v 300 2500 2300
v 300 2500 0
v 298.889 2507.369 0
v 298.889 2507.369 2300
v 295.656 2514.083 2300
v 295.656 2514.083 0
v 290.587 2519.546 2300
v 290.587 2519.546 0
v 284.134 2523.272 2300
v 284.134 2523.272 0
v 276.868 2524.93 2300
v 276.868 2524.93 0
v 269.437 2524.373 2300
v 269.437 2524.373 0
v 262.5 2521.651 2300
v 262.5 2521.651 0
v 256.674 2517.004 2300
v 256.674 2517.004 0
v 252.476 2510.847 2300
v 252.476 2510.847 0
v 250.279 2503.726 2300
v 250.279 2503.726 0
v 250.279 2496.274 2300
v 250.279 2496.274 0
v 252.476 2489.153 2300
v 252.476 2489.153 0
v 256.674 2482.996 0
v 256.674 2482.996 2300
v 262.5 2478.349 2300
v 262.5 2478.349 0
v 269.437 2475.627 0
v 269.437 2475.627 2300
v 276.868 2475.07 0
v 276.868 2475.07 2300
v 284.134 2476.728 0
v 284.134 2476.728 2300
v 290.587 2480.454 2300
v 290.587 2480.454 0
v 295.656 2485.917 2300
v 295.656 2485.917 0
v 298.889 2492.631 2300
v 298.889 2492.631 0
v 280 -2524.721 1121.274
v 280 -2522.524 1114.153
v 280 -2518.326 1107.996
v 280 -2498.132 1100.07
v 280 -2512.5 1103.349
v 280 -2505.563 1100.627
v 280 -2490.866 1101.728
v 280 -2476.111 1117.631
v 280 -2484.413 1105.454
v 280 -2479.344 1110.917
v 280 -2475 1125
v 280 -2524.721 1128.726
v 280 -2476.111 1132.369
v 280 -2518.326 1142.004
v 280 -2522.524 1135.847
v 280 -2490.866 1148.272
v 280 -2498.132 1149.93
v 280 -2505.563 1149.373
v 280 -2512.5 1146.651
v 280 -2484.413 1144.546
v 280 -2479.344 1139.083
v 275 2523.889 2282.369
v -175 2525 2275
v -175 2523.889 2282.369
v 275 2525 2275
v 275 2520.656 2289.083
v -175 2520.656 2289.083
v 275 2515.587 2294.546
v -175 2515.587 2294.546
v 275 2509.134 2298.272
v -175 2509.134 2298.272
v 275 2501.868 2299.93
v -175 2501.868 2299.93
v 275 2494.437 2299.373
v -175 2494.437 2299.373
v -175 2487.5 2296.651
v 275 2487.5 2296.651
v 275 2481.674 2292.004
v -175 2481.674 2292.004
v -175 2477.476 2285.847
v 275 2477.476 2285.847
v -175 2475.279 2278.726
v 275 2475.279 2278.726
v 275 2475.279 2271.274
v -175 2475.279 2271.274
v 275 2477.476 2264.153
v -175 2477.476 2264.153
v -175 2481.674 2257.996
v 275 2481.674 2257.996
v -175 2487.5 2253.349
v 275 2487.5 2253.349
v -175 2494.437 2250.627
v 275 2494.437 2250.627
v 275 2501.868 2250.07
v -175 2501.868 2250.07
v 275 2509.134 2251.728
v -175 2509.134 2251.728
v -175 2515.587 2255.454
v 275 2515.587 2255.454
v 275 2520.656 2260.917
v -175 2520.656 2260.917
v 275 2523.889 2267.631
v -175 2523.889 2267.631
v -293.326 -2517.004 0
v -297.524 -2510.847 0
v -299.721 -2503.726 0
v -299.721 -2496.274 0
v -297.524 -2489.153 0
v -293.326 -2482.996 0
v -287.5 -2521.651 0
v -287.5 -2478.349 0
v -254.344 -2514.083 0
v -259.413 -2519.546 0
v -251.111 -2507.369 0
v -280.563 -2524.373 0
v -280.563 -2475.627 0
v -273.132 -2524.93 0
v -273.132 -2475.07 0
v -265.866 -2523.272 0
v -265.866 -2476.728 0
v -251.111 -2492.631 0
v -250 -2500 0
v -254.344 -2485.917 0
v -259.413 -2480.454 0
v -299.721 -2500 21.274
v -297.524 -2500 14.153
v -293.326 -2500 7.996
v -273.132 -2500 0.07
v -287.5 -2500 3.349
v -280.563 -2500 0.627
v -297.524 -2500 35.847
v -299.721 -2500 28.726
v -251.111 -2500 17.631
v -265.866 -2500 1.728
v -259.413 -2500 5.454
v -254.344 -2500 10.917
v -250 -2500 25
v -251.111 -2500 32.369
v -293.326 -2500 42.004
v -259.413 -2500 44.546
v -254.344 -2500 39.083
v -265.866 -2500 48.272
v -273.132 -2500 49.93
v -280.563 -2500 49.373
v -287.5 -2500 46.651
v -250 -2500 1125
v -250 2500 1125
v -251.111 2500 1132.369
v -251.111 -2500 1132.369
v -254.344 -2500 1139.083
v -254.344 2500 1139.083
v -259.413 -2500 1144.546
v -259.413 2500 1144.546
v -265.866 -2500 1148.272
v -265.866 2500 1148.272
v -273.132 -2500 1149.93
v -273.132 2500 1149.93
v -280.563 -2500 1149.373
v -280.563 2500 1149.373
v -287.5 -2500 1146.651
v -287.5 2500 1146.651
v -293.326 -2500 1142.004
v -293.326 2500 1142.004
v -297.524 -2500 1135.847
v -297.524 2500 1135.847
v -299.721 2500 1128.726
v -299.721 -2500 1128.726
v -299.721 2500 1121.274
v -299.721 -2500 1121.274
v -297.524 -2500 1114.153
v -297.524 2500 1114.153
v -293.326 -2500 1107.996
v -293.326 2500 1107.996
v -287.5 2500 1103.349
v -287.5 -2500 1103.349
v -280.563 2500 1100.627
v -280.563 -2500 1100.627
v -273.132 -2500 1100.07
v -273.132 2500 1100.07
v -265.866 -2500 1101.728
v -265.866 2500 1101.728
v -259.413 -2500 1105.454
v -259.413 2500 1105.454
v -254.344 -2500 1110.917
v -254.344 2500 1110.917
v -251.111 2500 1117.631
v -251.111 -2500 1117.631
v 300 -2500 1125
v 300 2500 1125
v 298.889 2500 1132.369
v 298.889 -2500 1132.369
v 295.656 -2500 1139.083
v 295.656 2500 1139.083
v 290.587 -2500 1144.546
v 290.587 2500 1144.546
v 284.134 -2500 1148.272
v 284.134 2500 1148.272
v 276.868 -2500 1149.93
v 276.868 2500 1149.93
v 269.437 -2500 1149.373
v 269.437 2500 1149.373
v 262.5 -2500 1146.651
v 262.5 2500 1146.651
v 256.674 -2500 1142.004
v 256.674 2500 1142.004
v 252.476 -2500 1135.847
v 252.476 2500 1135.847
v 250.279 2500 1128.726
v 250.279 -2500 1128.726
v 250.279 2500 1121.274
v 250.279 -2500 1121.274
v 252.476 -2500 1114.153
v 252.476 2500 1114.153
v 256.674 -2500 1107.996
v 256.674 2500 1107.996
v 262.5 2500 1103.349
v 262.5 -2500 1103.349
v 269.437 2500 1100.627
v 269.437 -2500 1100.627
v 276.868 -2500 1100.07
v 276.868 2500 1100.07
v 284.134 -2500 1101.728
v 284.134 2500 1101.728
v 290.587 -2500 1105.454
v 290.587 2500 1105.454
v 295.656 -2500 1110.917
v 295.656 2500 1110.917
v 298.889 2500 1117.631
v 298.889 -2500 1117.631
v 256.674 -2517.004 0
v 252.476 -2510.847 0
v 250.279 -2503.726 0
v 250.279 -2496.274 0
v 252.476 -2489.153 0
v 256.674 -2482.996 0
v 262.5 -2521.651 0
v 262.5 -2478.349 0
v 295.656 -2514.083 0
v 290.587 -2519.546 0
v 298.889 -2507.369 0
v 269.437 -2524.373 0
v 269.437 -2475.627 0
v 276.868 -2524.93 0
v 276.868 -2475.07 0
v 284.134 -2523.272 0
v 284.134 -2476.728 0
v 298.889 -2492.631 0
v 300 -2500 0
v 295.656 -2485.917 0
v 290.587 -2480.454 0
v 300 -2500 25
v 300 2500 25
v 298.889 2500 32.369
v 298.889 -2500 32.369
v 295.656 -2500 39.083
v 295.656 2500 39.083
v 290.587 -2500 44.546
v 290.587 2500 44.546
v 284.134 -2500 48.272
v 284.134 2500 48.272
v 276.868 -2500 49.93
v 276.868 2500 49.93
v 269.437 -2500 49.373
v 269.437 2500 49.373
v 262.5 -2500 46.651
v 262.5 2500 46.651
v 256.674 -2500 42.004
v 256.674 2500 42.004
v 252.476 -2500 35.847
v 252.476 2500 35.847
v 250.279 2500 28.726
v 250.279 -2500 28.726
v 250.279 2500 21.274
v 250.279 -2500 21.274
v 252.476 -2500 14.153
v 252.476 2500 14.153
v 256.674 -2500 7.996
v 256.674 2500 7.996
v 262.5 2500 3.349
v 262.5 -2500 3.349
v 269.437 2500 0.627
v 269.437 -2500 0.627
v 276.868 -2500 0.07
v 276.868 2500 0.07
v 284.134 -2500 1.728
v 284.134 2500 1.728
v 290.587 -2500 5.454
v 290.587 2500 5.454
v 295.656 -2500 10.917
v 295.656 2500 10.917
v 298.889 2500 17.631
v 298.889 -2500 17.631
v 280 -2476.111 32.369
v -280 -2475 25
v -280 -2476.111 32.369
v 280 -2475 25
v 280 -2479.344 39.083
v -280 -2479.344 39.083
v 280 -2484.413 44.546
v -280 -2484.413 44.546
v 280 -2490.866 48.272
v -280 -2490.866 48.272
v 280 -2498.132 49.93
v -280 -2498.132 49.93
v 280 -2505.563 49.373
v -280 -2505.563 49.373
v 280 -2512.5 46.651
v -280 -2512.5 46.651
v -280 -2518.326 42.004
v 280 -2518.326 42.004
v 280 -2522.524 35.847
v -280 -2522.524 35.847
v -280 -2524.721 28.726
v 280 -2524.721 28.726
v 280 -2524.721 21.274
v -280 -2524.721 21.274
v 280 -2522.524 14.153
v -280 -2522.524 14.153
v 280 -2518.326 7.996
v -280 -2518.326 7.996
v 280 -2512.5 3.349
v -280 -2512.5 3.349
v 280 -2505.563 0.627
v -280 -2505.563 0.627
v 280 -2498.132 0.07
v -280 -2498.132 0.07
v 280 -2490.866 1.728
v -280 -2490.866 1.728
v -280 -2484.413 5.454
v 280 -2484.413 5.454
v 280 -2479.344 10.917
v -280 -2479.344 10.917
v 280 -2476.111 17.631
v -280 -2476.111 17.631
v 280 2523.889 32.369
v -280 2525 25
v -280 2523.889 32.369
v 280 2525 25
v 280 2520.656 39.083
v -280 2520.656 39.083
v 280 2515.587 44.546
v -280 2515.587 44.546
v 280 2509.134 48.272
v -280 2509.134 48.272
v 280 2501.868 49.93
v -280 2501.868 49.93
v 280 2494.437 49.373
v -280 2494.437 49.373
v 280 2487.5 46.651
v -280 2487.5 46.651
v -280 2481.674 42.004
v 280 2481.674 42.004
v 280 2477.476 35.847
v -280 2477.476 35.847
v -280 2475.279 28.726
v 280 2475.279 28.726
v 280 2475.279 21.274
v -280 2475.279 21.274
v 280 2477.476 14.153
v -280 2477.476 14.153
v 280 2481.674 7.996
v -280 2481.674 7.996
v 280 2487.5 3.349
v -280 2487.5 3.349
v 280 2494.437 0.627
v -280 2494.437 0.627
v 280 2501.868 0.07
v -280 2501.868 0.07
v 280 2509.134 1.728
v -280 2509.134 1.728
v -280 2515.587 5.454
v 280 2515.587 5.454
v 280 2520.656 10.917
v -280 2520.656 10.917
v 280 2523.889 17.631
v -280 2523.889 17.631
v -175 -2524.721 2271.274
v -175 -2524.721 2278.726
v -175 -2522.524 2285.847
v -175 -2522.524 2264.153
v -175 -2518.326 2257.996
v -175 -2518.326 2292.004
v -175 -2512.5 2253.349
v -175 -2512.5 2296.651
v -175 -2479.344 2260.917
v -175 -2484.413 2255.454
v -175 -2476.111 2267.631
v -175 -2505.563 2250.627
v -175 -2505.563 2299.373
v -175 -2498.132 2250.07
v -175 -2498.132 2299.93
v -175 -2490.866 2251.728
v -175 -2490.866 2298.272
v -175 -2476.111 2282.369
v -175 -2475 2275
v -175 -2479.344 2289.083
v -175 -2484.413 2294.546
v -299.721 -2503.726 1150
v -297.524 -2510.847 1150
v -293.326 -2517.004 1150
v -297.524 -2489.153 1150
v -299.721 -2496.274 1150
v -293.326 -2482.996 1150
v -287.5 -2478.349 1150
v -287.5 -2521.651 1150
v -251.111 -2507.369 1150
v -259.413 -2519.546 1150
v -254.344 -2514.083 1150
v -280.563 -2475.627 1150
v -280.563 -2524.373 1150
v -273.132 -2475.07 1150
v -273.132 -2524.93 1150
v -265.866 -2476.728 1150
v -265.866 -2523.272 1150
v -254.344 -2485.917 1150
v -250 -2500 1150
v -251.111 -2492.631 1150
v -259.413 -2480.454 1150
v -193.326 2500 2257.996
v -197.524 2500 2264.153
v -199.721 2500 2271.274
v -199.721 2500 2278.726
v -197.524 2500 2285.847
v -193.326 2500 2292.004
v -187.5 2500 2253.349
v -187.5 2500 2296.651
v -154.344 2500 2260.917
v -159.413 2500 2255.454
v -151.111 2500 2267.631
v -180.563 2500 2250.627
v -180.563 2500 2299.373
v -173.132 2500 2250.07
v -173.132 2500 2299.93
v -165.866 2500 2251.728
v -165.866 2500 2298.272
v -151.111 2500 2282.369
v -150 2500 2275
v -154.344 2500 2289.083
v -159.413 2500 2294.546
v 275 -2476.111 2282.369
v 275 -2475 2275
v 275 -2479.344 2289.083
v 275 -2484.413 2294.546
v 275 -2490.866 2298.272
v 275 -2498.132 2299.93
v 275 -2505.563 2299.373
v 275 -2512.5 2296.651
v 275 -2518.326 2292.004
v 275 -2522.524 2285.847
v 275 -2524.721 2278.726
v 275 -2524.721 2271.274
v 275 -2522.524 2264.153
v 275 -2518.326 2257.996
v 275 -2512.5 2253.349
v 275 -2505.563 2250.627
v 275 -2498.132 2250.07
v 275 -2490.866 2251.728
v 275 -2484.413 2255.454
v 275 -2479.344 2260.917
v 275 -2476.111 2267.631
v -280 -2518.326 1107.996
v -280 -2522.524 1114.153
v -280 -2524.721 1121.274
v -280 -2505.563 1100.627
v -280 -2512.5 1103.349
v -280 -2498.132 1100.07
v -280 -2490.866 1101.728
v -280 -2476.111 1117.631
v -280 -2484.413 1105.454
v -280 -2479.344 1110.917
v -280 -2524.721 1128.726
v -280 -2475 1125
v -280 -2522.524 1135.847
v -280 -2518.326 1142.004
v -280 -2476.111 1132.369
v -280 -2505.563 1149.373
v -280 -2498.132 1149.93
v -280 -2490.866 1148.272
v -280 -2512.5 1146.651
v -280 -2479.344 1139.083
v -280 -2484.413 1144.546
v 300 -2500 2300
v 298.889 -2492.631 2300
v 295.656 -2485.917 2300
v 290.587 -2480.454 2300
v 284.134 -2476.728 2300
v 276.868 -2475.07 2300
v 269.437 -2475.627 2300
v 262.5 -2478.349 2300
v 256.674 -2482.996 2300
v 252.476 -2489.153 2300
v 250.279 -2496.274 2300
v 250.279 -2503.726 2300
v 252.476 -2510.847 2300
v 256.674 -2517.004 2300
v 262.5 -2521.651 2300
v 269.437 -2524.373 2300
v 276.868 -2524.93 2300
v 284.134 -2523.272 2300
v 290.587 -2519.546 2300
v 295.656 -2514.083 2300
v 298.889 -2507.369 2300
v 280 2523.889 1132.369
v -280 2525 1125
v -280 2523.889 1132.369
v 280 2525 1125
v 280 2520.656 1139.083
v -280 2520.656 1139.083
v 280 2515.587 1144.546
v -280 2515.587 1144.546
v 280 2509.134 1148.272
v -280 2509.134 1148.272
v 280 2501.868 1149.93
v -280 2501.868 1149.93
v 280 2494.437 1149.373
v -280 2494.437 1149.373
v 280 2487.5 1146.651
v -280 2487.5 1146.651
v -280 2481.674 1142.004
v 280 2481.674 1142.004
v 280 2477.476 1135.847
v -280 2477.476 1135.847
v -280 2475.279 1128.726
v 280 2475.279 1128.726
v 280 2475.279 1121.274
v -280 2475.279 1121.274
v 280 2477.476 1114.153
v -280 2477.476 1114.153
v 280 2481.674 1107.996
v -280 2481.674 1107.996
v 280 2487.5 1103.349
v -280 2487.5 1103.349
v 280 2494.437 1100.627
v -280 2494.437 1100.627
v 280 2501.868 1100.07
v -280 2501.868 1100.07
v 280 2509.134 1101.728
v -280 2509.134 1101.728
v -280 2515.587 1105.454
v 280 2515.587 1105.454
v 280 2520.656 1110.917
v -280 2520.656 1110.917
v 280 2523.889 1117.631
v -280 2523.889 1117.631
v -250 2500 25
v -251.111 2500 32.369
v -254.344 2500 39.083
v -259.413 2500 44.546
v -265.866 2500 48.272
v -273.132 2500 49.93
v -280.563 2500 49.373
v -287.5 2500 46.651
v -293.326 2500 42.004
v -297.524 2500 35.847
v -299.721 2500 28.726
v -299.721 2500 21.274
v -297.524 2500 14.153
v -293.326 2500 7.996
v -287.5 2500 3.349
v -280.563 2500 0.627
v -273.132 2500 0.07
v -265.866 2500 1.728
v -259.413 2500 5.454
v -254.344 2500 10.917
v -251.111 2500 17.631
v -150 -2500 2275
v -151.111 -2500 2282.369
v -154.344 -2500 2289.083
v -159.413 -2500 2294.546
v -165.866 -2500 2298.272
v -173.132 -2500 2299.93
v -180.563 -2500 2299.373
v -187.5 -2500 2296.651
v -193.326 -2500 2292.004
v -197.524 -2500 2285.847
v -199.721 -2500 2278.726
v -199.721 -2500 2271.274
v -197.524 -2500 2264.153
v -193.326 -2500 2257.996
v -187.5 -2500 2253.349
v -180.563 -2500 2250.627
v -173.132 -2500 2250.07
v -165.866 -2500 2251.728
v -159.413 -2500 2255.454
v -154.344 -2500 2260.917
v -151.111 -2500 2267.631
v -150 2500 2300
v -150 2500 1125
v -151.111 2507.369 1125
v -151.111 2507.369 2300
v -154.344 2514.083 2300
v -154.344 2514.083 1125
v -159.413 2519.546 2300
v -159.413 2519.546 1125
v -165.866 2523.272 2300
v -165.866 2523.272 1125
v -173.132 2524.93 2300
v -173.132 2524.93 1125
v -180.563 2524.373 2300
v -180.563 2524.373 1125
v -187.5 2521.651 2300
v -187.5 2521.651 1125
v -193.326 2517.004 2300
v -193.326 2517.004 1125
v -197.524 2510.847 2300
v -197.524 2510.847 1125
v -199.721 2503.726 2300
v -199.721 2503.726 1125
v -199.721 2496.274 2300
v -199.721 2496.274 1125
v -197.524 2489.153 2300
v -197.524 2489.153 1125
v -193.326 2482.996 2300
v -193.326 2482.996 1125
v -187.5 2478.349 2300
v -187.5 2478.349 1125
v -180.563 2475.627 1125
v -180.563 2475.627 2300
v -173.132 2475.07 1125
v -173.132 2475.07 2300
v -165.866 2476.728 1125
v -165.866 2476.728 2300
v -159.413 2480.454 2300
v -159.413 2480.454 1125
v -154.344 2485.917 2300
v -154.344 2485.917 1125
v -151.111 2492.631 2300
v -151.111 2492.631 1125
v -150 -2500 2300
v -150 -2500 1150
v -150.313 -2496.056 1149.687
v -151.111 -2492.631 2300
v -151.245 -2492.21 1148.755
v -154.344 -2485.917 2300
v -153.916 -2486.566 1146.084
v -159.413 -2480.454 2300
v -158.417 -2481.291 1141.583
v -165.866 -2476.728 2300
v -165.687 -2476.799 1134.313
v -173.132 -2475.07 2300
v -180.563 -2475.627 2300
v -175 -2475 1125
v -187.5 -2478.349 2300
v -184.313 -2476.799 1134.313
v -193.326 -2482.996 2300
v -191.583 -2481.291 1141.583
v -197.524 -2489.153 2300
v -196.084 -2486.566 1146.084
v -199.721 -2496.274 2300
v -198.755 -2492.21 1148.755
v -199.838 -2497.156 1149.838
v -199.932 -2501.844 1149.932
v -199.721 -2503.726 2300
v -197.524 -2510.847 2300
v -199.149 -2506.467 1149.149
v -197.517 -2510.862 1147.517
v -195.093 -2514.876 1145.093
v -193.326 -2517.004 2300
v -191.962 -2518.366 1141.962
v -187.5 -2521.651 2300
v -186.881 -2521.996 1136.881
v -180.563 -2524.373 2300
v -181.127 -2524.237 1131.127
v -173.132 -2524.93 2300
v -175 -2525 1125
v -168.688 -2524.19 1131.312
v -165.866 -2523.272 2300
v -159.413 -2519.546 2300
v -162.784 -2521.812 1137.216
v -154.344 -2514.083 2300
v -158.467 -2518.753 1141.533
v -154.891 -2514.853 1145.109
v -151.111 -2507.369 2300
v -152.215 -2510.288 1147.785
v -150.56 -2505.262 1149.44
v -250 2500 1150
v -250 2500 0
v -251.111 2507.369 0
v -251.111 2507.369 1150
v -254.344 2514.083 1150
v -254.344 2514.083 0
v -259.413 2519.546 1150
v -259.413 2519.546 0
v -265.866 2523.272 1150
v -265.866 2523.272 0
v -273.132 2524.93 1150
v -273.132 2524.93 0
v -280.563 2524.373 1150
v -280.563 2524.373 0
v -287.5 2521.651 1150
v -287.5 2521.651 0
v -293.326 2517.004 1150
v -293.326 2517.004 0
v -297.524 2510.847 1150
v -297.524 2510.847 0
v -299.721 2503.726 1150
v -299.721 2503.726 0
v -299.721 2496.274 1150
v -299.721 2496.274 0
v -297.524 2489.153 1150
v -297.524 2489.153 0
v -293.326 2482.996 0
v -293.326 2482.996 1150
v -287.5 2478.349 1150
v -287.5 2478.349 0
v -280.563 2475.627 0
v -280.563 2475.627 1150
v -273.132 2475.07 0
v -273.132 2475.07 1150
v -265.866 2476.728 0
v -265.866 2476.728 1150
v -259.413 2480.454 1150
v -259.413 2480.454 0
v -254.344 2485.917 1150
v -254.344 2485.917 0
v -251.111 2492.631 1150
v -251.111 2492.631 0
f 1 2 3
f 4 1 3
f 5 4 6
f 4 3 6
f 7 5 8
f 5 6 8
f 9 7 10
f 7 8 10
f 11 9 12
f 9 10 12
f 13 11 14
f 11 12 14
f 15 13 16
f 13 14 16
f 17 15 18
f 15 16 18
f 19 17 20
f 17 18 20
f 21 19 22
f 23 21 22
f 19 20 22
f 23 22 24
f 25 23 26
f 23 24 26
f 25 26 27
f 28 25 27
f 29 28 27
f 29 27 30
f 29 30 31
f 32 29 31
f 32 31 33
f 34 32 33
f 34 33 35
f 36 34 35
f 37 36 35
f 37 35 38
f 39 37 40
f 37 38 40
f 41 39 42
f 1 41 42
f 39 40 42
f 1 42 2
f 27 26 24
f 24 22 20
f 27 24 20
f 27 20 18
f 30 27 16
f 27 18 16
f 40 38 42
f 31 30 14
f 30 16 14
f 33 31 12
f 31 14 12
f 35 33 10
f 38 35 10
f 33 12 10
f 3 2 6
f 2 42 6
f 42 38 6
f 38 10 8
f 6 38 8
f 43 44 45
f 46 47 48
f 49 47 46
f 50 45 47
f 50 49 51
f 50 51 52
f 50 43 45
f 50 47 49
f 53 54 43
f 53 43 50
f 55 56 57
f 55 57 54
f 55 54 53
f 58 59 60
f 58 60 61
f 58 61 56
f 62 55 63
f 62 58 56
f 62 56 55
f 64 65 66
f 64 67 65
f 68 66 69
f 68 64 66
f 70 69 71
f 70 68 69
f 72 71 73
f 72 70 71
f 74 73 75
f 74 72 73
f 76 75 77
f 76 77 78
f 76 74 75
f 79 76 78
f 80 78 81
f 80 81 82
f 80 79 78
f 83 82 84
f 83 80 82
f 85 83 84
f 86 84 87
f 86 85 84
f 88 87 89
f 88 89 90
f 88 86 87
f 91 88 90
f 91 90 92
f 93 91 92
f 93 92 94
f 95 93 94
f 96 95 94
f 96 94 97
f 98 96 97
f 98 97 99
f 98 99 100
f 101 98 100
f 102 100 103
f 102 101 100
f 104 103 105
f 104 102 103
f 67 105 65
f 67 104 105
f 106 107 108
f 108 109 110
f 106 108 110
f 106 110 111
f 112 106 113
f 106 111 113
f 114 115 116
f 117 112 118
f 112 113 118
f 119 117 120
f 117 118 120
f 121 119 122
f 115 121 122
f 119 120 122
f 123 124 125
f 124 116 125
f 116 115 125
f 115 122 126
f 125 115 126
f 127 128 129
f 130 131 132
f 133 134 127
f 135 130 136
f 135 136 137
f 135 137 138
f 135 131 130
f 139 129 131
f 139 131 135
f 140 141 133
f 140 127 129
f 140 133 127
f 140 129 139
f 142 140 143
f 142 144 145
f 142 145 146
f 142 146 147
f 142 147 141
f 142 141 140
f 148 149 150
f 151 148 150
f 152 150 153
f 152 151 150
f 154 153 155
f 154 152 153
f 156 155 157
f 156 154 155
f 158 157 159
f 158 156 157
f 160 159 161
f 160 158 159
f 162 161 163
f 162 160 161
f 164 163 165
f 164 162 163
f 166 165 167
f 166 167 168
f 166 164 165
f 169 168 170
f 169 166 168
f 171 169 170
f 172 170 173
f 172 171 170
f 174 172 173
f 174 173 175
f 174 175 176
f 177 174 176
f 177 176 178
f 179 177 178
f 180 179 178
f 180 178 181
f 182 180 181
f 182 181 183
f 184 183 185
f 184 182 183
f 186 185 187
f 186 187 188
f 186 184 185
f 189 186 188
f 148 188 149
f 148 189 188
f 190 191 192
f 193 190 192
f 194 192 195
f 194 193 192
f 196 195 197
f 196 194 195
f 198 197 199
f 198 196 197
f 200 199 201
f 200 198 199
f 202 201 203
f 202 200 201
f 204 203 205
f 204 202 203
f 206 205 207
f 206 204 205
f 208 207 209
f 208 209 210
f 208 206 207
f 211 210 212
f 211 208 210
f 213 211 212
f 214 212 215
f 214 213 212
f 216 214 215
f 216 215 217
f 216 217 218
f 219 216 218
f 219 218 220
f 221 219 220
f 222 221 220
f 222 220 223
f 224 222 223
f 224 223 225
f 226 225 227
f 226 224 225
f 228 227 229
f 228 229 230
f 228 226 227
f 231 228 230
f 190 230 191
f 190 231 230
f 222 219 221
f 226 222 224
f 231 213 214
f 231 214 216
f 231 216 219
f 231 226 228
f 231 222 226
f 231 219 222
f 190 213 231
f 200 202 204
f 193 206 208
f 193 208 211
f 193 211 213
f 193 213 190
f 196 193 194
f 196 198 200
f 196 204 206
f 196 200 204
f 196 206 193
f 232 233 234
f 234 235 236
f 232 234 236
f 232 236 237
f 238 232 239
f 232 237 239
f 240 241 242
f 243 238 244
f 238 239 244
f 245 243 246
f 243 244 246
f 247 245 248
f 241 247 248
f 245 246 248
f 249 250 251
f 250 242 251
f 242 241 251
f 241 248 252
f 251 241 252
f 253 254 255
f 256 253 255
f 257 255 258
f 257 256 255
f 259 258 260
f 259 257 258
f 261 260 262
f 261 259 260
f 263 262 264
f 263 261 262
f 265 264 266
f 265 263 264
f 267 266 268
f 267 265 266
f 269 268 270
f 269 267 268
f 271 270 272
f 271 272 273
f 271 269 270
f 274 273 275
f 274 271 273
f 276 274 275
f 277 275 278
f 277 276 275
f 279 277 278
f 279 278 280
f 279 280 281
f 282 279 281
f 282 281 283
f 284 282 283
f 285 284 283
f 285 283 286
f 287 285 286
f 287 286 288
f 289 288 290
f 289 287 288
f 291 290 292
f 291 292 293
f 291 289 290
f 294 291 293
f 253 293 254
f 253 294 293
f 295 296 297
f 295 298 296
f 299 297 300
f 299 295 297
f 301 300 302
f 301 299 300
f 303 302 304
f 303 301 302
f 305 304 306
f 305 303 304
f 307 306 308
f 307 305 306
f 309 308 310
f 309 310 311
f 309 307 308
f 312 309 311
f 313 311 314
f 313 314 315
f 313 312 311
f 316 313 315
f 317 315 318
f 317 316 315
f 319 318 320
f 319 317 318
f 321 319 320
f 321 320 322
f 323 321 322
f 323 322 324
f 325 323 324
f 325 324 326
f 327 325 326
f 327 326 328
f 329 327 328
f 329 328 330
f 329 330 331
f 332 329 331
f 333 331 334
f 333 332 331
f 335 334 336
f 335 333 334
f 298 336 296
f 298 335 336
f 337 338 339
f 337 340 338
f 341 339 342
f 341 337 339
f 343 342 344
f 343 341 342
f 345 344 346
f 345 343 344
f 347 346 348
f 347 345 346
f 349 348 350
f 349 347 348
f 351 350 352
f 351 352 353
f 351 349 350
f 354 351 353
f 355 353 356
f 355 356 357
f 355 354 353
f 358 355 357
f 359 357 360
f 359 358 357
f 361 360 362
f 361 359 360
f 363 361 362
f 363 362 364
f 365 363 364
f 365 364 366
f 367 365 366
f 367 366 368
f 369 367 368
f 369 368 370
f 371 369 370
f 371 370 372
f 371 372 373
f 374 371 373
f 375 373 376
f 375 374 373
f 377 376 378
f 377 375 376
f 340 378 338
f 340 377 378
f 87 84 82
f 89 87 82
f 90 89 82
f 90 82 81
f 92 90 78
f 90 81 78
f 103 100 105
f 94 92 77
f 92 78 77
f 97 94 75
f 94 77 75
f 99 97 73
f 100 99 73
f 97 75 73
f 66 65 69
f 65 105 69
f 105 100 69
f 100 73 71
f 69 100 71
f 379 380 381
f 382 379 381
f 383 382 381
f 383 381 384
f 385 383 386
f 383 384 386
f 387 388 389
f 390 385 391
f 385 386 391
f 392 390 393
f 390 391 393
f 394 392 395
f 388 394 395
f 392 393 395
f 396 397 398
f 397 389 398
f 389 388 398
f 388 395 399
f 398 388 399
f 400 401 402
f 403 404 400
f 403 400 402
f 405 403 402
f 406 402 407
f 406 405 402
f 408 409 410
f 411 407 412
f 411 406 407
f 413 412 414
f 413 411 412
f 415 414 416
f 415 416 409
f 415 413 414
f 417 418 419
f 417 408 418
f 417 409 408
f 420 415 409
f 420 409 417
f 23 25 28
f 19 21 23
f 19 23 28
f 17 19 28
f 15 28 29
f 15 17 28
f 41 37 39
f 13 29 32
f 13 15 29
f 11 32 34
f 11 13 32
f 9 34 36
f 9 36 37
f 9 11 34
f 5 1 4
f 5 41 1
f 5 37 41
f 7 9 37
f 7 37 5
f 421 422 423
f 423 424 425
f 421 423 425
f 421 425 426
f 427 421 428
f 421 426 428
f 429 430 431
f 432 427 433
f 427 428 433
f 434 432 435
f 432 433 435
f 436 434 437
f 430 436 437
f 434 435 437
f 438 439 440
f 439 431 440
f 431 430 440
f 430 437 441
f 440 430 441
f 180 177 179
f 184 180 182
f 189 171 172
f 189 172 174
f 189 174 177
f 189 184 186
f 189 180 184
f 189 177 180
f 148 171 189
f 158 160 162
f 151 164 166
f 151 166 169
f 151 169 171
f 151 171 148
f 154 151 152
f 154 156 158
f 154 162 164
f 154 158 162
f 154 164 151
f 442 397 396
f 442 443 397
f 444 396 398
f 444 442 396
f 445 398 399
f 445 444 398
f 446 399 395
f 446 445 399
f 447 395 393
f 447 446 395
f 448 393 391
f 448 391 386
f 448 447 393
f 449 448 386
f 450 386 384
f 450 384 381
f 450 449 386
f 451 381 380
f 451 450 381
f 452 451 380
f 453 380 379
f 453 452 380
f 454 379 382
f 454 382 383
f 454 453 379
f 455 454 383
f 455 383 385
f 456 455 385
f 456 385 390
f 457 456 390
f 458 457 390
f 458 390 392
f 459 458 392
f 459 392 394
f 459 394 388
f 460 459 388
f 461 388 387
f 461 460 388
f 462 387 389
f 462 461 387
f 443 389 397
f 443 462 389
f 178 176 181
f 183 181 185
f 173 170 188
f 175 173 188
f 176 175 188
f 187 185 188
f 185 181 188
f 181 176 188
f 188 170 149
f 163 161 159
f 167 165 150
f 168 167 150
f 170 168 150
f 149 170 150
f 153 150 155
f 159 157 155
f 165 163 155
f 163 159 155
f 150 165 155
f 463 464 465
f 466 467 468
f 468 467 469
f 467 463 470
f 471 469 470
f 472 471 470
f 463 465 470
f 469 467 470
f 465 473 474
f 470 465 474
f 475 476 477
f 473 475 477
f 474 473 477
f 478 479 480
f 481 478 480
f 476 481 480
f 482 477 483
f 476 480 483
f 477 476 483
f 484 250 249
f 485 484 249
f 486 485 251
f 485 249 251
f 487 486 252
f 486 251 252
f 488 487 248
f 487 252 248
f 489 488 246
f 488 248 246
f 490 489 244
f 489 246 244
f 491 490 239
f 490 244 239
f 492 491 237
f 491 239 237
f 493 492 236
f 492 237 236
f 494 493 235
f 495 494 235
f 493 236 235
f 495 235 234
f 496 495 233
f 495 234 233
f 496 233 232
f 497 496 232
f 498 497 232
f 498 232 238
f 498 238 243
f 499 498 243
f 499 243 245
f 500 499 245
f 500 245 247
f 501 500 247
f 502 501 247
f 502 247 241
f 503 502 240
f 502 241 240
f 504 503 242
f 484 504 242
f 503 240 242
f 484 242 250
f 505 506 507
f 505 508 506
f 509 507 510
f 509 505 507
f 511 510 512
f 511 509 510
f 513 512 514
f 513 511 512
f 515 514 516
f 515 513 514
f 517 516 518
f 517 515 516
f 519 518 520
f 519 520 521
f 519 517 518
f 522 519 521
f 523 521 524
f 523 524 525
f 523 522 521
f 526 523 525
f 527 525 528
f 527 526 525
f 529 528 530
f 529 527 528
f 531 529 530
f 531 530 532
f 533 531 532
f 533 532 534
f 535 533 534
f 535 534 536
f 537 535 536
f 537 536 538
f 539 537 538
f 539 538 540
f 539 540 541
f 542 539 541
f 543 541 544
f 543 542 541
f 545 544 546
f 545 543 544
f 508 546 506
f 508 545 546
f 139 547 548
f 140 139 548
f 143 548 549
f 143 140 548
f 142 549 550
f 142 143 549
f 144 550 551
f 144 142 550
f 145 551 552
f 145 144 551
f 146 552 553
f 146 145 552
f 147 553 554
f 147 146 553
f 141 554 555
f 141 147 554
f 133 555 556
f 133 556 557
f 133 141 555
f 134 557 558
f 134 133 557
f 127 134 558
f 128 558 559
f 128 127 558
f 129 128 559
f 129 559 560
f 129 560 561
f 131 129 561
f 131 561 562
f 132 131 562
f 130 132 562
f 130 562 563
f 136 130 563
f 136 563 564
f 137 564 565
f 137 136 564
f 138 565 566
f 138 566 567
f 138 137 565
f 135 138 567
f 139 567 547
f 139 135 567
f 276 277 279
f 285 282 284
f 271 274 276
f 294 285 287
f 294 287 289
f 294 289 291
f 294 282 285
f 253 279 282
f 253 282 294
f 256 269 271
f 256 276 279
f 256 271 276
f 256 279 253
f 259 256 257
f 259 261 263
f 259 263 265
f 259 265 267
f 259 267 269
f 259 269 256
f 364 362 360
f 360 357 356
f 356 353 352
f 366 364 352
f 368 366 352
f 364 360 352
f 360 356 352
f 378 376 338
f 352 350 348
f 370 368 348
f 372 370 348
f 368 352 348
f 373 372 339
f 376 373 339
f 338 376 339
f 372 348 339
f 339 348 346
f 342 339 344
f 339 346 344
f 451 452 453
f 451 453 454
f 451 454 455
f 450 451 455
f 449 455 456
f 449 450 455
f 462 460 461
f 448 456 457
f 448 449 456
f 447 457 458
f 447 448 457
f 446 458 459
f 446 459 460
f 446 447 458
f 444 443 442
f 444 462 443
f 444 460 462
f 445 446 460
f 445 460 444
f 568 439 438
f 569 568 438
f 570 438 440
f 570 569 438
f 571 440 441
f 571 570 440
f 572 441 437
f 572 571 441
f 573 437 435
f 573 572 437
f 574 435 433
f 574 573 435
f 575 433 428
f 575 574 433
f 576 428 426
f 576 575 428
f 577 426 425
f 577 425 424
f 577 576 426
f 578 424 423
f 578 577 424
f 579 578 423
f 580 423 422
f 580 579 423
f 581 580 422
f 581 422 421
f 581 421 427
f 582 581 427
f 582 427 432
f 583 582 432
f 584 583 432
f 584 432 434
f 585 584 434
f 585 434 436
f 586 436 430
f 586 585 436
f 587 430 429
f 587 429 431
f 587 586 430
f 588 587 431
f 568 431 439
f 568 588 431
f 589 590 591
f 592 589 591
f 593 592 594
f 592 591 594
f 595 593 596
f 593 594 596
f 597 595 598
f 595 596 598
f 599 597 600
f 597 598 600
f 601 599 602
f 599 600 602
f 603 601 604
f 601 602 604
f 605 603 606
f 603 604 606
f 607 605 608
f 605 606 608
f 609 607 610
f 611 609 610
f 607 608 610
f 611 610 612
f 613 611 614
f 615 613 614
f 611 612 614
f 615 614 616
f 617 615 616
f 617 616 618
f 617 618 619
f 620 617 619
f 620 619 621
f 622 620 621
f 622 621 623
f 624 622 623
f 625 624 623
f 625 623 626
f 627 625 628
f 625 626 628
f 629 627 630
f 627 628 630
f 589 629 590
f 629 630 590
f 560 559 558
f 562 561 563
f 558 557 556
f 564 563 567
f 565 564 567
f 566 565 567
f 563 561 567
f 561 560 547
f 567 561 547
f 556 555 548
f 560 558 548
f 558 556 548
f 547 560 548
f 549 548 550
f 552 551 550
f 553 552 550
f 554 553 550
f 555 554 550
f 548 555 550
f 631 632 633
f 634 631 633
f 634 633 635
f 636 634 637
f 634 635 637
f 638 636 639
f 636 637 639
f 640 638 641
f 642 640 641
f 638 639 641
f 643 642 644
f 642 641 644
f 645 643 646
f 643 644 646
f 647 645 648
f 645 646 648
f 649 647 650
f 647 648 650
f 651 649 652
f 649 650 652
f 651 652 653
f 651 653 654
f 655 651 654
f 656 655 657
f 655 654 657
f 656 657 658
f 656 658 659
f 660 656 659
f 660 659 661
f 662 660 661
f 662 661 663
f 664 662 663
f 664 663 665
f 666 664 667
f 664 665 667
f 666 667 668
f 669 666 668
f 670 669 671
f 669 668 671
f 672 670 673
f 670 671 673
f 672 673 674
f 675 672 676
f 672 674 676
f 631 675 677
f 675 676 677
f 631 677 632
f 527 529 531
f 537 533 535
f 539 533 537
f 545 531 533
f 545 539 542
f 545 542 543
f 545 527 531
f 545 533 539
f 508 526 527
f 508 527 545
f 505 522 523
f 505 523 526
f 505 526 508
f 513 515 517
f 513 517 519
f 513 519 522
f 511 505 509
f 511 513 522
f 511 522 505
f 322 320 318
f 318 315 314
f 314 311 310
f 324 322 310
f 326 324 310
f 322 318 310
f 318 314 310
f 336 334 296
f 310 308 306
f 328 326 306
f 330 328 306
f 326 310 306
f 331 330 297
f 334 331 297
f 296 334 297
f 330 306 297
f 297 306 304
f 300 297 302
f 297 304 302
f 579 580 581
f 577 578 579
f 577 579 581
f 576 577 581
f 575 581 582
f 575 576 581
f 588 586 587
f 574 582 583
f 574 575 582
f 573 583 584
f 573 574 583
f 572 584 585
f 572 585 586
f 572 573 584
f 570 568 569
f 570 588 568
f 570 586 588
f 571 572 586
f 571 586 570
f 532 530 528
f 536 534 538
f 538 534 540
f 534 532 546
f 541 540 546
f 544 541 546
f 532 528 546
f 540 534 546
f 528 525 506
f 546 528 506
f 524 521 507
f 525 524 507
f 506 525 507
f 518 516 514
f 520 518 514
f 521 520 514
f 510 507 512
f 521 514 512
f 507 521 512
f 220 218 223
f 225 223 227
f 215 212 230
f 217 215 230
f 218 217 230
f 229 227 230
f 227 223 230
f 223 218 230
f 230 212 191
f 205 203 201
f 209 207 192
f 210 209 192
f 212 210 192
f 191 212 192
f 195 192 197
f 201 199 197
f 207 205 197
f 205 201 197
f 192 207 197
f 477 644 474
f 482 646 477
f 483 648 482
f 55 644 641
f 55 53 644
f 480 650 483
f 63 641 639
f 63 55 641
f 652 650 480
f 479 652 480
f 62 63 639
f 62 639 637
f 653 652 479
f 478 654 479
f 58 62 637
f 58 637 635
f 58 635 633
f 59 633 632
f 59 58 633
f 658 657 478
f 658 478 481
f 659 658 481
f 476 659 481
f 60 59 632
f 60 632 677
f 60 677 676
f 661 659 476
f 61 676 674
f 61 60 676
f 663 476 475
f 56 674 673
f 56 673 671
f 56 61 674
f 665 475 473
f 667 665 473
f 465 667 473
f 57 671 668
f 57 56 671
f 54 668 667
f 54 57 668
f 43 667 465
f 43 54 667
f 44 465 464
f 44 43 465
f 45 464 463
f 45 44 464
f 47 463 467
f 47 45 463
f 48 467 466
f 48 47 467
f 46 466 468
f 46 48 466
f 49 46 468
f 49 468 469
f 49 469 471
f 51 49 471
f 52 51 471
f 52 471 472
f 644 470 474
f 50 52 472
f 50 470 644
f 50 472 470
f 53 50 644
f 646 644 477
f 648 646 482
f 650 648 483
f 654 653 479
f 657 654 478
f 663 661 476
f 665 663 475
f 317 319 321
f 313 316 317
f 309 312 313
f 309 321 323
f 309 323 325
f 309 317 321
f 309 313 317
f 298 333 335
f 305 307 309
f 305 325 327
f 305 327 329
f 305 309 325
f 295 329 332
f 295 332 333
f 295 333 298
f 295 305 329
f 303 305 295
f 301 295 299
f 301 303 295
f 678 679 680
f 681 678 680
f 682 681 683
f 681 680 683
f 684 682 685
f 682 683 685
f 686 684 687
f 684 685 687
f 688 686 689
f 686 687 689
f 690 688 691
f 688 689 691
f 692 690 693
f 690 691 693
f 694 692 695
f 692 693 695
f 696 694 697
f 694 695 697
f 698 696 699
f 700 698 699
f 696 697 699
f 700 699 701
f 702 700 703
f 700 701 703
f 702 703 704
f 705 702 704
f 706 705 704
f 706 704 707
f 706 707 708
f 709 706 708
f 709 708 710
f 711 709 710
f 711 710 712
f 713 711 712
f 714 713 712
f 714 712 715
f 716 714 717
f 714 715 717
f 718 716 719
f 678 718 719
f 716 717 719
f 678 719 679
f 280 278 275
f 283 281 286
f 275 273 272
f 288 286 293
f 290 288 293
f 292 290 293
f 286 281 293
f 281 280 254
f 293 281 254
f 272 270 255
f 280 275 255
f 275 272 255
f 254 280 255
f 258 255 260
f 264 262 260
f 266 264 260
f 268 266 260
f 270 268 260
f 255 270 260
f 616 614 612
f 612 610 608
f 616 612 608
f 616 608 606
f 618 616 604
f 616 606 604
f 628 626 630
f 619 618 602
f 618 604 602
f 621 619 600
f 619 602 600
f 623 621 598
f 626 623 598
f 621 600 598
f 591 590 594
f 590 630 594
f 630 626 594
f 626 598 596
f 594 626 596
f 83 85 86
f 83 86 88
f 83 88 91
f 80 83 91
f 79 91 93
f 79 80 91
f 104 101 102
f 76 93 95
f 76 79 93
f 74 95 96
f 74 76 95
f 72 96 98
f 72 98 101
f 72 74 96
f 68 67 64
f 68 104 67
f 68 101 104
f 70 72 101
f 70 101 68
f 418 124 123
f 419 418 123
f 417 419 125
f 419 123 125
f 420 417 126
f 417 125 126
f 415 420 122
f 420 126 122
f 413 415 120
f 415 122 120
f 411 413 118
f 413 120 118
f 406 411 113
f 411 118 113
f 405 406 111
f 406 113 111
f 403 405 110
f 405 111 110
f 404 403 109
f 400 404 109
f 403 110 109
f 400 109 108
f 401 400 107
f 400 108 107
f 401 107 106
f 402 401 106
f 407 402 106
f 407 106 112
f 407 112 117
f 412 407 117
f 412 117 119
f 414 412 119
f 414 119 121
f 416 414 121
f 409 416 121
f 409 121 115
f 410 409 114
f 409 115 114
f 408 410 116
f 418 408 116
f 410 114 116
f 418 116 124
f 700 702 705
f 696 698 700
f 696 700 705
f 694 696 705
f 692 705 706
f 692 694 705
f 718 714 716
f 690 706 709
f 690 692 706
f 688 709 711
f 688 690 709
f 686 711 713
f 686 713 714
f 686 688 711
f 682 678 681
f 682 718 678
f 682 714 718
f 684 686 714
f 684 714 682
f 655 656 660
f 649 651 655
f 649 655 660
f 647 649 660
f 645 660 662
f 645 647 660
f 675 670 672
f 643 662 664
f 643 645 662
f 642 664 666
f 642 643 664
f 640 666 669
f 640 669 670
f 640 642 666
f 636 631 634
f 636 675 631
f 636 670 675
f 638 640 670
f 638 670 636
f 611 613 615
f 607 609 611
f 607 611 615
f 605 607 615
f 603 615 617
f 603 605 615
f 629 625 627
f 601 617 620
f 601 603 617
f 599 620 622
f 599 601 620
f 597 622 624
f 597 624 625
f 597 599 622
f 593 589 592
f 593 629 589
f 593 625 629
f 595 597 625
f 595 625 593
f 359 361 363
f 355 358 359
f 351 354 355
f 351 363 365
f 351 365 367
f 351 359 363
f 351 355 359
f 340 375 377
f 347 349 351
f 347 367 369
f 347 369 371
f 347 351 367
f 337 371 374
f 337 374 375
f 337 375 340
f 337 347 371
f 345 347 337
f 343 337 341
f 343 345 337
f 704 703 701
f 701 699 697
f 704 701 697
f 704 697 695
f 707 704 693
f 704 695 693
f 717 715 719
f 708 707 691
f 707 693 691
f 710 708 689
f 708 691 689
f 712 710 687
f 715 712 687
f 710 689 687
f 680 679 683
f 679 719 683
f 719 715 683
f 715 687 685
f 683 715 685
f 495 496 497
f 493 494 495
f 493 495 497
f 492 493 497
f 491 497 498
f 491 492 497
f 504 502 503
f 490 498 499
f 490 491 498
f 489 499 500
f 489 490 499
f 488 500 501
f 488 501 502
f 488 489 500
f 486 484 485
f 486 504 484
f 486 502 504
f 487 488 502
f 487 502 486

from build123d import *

# Parameters (mm, degrees)
F1_R           = 25
F2_DEPTH       = 2300
F3_R           = 25
F4_DEPTH       = 1150
F5_R           = 25
F6_DEPTH       = 2500
F6_DEPTH_BACK  = 2500
F7_R           = 25
F8_DEPTH       = 280
F8_DEPTH_BACK  = 280
F10_R          = 25
F11_DEPTH      = 1175
F12_R          = 25
F13_DEPTH      = 275
F13_DEPTH_BACK = 175


with BuildPart() as f2:
    # F1 (on Top) → F2 (new body)
    with BuildSketch(Plane.XY):
        with Locations((275, 2500)):
            Circle(F1_R)
    extrude(amount=F2_DEPTH)


with BuildPart() as f2b:
    # F1 (on Top) → F2, piece 2 (new body)
    with BuildSketch(Plane.XY):
        with Locations((275, -2500)):
            Circle(F1_R)
    extrude(amount=F2_DEPTH)


with BuildPart() as f4:
    # F3 (on Top) → F4 (new body)
    with BuildSketch(Plane.XY):
        with Locations((-275, -2500)):
            Circle(F3_R)
    extrude(amount=F4_DEPTH)


with BuildPart() as f4b:
    # F3 (on Top) → F4, piece 2 (new body)
    with BuildSketch(Plane.XY):
        with Locations((-275, 2500)):
            Circle(F3_R)
    extrude(amount=F4_DEPTH)


with BuildPart() as f6:
    # F5 (on Front) → F6 (new body, two sides)
    with BuildSketch(Plane.XZ) as f6_sk:
        with Locations((275, 25)):
            Circle(F5_R)
    extrude(amount=F6_DEPTH)
    extrude(f6_sk.sketch, amount=-F6_DEPTH_BACK)


with BuildPart() as f6b:
    # F5 (on Front) → F6, piece 2 (new body, two sides)
    with BuildSketch(Plane.XZ) as f6_2_sk:
        with Locations((275, 1125)):
            Circle(F5_R)
    extrude(amount=F6_DEPTH)
    extrude(f6_2_sk.sketch, amount=-F6_DEPTH_BACK)


with BuildPart() as f6c:
    # F5 (on Front) → F6, piece 3 (new body, two sides)
    with BuildSketch(Plane.XZ) as f6_3_sk:
        with Locations((-275, 1125)):
            Circle(F5_R)
    extrude(amount=F6_DEPTH)
    extrude(f6_3_sk.sketch, amount=-F6_DEPTH_BACK)


with BuildPart() as f6d:
    # F5 (on Front) → F6, piece 4 (new body, two sides)
    with BuildSketch(Plane.XZ) as f6_4_sk:
        with Locations((-275, 25)):
            Circle(F5_R)
    extrude(amount=F6_DEPTH)
    extrude(f6_4_sk.sketch, amount=-F6_DEPTH_BACK)


with BuildPart() as f6e:
    # F5 (on Front) → F6, piece 5 (new body, two sides)
    with BuildSketch(Plane.XZ) as f6_5_sk:
        with Locations((-175, 2275)):
            Circle(F5_R)
    extrude(amount=F6_DEPTH)
    extrude(f6_5_sk.sketch, amount=-F6_DEPTH_BACK)


with BuildPart() as f8:
    # F7 (on face) → F8 (new body, two sides)
    with BuildSketch(Plane.YZ) as f8_sk:
        with Locations((2500, 25)):
            Circle(F7_R)
    extrude(amount=F8_DEPTH)
    extrude(f8_sk.sketch, amount=-F8_DEPTH_BACK)


with BuildPart() as f8b:
    # F7 (on face) → F8, piece 2 (new body, two sides)
    with BuildSketch(Plane.YZ) as f8_2_sk:
        with Locations((-2500, 25)):
            Circle(F7_R)
    extrude(amount=F8_DEPTH)
    extrude(f8_2_sk.sketch, amount=-F8_DEPTH_BACK)


with BuildPart() as f8c:
    # F7 (on face) → F8, piece 3 (new body, two sides)
    with BuildSketch(Plane.YZ) as f8_3_sk:
        with Locations((-2500, 1125)):
            Circle(F7_R)
    extrude(amount=F8_DEPTH)
    extrude(f8_3_sk.sketch, amount=-F8_DEPTH_BACK)

    # F10 (on offset) → F11 (join, through all)
    with BuildSketch(Plane.XY.offset(1125)):
        with Locations((-175, -2500)):
            Circle(F10_R)
        with Locations((-175, 2500)):
            Circle(F10_R)
    extrude(amount=F11_DEPTH)


with BuildPart() as f8d:
    # F7 (on face) → F8, piece 4 (new body, two sides)
    with BuildSketch(Plane.YZ) as f8_4_sk:
        with Locations((2500, 1125)):
            Circle(F7_R)
    extrude(amount=F8_DEPTH)
    extrude(f8_4_sk.sketch, amount=-F8_DEPTH_BACK)


with BuildPart() as f13:
    # F12 (on Right) → F13 (new body, two sides)
    with BuildSketch(Plane.YZ) as f13_sk:
        with Locations((-2500, 2275)):
            Circle(F12_R)
    extrude(amount=F13_DEPTH)
    extrude(f13_sk.sketch, amount=-F13_DEPTH_BACK)


with BuildPart() as f13b:
    # F12 (on Right) → F13, piece 2 (new body, two sides)
    with BuildSketch(Plane.YZ) as f13_2_sk:
        with Locations((2500, 2275)):
            Circle(F12_R)
    extrude(amount=F13_DEPTH)
    extrude(f13_2_sk.sketch, amount=-F13_DEPTH_BACK)


solid = Compound([f2.part, f2b.part, f4.part, f4b.part, f6.part, f6b.part, f6c.part, f6d.part, f6e.part, f8.part, f8b.part, f8c.part, f8d.part, f13.part, f13b.part])
